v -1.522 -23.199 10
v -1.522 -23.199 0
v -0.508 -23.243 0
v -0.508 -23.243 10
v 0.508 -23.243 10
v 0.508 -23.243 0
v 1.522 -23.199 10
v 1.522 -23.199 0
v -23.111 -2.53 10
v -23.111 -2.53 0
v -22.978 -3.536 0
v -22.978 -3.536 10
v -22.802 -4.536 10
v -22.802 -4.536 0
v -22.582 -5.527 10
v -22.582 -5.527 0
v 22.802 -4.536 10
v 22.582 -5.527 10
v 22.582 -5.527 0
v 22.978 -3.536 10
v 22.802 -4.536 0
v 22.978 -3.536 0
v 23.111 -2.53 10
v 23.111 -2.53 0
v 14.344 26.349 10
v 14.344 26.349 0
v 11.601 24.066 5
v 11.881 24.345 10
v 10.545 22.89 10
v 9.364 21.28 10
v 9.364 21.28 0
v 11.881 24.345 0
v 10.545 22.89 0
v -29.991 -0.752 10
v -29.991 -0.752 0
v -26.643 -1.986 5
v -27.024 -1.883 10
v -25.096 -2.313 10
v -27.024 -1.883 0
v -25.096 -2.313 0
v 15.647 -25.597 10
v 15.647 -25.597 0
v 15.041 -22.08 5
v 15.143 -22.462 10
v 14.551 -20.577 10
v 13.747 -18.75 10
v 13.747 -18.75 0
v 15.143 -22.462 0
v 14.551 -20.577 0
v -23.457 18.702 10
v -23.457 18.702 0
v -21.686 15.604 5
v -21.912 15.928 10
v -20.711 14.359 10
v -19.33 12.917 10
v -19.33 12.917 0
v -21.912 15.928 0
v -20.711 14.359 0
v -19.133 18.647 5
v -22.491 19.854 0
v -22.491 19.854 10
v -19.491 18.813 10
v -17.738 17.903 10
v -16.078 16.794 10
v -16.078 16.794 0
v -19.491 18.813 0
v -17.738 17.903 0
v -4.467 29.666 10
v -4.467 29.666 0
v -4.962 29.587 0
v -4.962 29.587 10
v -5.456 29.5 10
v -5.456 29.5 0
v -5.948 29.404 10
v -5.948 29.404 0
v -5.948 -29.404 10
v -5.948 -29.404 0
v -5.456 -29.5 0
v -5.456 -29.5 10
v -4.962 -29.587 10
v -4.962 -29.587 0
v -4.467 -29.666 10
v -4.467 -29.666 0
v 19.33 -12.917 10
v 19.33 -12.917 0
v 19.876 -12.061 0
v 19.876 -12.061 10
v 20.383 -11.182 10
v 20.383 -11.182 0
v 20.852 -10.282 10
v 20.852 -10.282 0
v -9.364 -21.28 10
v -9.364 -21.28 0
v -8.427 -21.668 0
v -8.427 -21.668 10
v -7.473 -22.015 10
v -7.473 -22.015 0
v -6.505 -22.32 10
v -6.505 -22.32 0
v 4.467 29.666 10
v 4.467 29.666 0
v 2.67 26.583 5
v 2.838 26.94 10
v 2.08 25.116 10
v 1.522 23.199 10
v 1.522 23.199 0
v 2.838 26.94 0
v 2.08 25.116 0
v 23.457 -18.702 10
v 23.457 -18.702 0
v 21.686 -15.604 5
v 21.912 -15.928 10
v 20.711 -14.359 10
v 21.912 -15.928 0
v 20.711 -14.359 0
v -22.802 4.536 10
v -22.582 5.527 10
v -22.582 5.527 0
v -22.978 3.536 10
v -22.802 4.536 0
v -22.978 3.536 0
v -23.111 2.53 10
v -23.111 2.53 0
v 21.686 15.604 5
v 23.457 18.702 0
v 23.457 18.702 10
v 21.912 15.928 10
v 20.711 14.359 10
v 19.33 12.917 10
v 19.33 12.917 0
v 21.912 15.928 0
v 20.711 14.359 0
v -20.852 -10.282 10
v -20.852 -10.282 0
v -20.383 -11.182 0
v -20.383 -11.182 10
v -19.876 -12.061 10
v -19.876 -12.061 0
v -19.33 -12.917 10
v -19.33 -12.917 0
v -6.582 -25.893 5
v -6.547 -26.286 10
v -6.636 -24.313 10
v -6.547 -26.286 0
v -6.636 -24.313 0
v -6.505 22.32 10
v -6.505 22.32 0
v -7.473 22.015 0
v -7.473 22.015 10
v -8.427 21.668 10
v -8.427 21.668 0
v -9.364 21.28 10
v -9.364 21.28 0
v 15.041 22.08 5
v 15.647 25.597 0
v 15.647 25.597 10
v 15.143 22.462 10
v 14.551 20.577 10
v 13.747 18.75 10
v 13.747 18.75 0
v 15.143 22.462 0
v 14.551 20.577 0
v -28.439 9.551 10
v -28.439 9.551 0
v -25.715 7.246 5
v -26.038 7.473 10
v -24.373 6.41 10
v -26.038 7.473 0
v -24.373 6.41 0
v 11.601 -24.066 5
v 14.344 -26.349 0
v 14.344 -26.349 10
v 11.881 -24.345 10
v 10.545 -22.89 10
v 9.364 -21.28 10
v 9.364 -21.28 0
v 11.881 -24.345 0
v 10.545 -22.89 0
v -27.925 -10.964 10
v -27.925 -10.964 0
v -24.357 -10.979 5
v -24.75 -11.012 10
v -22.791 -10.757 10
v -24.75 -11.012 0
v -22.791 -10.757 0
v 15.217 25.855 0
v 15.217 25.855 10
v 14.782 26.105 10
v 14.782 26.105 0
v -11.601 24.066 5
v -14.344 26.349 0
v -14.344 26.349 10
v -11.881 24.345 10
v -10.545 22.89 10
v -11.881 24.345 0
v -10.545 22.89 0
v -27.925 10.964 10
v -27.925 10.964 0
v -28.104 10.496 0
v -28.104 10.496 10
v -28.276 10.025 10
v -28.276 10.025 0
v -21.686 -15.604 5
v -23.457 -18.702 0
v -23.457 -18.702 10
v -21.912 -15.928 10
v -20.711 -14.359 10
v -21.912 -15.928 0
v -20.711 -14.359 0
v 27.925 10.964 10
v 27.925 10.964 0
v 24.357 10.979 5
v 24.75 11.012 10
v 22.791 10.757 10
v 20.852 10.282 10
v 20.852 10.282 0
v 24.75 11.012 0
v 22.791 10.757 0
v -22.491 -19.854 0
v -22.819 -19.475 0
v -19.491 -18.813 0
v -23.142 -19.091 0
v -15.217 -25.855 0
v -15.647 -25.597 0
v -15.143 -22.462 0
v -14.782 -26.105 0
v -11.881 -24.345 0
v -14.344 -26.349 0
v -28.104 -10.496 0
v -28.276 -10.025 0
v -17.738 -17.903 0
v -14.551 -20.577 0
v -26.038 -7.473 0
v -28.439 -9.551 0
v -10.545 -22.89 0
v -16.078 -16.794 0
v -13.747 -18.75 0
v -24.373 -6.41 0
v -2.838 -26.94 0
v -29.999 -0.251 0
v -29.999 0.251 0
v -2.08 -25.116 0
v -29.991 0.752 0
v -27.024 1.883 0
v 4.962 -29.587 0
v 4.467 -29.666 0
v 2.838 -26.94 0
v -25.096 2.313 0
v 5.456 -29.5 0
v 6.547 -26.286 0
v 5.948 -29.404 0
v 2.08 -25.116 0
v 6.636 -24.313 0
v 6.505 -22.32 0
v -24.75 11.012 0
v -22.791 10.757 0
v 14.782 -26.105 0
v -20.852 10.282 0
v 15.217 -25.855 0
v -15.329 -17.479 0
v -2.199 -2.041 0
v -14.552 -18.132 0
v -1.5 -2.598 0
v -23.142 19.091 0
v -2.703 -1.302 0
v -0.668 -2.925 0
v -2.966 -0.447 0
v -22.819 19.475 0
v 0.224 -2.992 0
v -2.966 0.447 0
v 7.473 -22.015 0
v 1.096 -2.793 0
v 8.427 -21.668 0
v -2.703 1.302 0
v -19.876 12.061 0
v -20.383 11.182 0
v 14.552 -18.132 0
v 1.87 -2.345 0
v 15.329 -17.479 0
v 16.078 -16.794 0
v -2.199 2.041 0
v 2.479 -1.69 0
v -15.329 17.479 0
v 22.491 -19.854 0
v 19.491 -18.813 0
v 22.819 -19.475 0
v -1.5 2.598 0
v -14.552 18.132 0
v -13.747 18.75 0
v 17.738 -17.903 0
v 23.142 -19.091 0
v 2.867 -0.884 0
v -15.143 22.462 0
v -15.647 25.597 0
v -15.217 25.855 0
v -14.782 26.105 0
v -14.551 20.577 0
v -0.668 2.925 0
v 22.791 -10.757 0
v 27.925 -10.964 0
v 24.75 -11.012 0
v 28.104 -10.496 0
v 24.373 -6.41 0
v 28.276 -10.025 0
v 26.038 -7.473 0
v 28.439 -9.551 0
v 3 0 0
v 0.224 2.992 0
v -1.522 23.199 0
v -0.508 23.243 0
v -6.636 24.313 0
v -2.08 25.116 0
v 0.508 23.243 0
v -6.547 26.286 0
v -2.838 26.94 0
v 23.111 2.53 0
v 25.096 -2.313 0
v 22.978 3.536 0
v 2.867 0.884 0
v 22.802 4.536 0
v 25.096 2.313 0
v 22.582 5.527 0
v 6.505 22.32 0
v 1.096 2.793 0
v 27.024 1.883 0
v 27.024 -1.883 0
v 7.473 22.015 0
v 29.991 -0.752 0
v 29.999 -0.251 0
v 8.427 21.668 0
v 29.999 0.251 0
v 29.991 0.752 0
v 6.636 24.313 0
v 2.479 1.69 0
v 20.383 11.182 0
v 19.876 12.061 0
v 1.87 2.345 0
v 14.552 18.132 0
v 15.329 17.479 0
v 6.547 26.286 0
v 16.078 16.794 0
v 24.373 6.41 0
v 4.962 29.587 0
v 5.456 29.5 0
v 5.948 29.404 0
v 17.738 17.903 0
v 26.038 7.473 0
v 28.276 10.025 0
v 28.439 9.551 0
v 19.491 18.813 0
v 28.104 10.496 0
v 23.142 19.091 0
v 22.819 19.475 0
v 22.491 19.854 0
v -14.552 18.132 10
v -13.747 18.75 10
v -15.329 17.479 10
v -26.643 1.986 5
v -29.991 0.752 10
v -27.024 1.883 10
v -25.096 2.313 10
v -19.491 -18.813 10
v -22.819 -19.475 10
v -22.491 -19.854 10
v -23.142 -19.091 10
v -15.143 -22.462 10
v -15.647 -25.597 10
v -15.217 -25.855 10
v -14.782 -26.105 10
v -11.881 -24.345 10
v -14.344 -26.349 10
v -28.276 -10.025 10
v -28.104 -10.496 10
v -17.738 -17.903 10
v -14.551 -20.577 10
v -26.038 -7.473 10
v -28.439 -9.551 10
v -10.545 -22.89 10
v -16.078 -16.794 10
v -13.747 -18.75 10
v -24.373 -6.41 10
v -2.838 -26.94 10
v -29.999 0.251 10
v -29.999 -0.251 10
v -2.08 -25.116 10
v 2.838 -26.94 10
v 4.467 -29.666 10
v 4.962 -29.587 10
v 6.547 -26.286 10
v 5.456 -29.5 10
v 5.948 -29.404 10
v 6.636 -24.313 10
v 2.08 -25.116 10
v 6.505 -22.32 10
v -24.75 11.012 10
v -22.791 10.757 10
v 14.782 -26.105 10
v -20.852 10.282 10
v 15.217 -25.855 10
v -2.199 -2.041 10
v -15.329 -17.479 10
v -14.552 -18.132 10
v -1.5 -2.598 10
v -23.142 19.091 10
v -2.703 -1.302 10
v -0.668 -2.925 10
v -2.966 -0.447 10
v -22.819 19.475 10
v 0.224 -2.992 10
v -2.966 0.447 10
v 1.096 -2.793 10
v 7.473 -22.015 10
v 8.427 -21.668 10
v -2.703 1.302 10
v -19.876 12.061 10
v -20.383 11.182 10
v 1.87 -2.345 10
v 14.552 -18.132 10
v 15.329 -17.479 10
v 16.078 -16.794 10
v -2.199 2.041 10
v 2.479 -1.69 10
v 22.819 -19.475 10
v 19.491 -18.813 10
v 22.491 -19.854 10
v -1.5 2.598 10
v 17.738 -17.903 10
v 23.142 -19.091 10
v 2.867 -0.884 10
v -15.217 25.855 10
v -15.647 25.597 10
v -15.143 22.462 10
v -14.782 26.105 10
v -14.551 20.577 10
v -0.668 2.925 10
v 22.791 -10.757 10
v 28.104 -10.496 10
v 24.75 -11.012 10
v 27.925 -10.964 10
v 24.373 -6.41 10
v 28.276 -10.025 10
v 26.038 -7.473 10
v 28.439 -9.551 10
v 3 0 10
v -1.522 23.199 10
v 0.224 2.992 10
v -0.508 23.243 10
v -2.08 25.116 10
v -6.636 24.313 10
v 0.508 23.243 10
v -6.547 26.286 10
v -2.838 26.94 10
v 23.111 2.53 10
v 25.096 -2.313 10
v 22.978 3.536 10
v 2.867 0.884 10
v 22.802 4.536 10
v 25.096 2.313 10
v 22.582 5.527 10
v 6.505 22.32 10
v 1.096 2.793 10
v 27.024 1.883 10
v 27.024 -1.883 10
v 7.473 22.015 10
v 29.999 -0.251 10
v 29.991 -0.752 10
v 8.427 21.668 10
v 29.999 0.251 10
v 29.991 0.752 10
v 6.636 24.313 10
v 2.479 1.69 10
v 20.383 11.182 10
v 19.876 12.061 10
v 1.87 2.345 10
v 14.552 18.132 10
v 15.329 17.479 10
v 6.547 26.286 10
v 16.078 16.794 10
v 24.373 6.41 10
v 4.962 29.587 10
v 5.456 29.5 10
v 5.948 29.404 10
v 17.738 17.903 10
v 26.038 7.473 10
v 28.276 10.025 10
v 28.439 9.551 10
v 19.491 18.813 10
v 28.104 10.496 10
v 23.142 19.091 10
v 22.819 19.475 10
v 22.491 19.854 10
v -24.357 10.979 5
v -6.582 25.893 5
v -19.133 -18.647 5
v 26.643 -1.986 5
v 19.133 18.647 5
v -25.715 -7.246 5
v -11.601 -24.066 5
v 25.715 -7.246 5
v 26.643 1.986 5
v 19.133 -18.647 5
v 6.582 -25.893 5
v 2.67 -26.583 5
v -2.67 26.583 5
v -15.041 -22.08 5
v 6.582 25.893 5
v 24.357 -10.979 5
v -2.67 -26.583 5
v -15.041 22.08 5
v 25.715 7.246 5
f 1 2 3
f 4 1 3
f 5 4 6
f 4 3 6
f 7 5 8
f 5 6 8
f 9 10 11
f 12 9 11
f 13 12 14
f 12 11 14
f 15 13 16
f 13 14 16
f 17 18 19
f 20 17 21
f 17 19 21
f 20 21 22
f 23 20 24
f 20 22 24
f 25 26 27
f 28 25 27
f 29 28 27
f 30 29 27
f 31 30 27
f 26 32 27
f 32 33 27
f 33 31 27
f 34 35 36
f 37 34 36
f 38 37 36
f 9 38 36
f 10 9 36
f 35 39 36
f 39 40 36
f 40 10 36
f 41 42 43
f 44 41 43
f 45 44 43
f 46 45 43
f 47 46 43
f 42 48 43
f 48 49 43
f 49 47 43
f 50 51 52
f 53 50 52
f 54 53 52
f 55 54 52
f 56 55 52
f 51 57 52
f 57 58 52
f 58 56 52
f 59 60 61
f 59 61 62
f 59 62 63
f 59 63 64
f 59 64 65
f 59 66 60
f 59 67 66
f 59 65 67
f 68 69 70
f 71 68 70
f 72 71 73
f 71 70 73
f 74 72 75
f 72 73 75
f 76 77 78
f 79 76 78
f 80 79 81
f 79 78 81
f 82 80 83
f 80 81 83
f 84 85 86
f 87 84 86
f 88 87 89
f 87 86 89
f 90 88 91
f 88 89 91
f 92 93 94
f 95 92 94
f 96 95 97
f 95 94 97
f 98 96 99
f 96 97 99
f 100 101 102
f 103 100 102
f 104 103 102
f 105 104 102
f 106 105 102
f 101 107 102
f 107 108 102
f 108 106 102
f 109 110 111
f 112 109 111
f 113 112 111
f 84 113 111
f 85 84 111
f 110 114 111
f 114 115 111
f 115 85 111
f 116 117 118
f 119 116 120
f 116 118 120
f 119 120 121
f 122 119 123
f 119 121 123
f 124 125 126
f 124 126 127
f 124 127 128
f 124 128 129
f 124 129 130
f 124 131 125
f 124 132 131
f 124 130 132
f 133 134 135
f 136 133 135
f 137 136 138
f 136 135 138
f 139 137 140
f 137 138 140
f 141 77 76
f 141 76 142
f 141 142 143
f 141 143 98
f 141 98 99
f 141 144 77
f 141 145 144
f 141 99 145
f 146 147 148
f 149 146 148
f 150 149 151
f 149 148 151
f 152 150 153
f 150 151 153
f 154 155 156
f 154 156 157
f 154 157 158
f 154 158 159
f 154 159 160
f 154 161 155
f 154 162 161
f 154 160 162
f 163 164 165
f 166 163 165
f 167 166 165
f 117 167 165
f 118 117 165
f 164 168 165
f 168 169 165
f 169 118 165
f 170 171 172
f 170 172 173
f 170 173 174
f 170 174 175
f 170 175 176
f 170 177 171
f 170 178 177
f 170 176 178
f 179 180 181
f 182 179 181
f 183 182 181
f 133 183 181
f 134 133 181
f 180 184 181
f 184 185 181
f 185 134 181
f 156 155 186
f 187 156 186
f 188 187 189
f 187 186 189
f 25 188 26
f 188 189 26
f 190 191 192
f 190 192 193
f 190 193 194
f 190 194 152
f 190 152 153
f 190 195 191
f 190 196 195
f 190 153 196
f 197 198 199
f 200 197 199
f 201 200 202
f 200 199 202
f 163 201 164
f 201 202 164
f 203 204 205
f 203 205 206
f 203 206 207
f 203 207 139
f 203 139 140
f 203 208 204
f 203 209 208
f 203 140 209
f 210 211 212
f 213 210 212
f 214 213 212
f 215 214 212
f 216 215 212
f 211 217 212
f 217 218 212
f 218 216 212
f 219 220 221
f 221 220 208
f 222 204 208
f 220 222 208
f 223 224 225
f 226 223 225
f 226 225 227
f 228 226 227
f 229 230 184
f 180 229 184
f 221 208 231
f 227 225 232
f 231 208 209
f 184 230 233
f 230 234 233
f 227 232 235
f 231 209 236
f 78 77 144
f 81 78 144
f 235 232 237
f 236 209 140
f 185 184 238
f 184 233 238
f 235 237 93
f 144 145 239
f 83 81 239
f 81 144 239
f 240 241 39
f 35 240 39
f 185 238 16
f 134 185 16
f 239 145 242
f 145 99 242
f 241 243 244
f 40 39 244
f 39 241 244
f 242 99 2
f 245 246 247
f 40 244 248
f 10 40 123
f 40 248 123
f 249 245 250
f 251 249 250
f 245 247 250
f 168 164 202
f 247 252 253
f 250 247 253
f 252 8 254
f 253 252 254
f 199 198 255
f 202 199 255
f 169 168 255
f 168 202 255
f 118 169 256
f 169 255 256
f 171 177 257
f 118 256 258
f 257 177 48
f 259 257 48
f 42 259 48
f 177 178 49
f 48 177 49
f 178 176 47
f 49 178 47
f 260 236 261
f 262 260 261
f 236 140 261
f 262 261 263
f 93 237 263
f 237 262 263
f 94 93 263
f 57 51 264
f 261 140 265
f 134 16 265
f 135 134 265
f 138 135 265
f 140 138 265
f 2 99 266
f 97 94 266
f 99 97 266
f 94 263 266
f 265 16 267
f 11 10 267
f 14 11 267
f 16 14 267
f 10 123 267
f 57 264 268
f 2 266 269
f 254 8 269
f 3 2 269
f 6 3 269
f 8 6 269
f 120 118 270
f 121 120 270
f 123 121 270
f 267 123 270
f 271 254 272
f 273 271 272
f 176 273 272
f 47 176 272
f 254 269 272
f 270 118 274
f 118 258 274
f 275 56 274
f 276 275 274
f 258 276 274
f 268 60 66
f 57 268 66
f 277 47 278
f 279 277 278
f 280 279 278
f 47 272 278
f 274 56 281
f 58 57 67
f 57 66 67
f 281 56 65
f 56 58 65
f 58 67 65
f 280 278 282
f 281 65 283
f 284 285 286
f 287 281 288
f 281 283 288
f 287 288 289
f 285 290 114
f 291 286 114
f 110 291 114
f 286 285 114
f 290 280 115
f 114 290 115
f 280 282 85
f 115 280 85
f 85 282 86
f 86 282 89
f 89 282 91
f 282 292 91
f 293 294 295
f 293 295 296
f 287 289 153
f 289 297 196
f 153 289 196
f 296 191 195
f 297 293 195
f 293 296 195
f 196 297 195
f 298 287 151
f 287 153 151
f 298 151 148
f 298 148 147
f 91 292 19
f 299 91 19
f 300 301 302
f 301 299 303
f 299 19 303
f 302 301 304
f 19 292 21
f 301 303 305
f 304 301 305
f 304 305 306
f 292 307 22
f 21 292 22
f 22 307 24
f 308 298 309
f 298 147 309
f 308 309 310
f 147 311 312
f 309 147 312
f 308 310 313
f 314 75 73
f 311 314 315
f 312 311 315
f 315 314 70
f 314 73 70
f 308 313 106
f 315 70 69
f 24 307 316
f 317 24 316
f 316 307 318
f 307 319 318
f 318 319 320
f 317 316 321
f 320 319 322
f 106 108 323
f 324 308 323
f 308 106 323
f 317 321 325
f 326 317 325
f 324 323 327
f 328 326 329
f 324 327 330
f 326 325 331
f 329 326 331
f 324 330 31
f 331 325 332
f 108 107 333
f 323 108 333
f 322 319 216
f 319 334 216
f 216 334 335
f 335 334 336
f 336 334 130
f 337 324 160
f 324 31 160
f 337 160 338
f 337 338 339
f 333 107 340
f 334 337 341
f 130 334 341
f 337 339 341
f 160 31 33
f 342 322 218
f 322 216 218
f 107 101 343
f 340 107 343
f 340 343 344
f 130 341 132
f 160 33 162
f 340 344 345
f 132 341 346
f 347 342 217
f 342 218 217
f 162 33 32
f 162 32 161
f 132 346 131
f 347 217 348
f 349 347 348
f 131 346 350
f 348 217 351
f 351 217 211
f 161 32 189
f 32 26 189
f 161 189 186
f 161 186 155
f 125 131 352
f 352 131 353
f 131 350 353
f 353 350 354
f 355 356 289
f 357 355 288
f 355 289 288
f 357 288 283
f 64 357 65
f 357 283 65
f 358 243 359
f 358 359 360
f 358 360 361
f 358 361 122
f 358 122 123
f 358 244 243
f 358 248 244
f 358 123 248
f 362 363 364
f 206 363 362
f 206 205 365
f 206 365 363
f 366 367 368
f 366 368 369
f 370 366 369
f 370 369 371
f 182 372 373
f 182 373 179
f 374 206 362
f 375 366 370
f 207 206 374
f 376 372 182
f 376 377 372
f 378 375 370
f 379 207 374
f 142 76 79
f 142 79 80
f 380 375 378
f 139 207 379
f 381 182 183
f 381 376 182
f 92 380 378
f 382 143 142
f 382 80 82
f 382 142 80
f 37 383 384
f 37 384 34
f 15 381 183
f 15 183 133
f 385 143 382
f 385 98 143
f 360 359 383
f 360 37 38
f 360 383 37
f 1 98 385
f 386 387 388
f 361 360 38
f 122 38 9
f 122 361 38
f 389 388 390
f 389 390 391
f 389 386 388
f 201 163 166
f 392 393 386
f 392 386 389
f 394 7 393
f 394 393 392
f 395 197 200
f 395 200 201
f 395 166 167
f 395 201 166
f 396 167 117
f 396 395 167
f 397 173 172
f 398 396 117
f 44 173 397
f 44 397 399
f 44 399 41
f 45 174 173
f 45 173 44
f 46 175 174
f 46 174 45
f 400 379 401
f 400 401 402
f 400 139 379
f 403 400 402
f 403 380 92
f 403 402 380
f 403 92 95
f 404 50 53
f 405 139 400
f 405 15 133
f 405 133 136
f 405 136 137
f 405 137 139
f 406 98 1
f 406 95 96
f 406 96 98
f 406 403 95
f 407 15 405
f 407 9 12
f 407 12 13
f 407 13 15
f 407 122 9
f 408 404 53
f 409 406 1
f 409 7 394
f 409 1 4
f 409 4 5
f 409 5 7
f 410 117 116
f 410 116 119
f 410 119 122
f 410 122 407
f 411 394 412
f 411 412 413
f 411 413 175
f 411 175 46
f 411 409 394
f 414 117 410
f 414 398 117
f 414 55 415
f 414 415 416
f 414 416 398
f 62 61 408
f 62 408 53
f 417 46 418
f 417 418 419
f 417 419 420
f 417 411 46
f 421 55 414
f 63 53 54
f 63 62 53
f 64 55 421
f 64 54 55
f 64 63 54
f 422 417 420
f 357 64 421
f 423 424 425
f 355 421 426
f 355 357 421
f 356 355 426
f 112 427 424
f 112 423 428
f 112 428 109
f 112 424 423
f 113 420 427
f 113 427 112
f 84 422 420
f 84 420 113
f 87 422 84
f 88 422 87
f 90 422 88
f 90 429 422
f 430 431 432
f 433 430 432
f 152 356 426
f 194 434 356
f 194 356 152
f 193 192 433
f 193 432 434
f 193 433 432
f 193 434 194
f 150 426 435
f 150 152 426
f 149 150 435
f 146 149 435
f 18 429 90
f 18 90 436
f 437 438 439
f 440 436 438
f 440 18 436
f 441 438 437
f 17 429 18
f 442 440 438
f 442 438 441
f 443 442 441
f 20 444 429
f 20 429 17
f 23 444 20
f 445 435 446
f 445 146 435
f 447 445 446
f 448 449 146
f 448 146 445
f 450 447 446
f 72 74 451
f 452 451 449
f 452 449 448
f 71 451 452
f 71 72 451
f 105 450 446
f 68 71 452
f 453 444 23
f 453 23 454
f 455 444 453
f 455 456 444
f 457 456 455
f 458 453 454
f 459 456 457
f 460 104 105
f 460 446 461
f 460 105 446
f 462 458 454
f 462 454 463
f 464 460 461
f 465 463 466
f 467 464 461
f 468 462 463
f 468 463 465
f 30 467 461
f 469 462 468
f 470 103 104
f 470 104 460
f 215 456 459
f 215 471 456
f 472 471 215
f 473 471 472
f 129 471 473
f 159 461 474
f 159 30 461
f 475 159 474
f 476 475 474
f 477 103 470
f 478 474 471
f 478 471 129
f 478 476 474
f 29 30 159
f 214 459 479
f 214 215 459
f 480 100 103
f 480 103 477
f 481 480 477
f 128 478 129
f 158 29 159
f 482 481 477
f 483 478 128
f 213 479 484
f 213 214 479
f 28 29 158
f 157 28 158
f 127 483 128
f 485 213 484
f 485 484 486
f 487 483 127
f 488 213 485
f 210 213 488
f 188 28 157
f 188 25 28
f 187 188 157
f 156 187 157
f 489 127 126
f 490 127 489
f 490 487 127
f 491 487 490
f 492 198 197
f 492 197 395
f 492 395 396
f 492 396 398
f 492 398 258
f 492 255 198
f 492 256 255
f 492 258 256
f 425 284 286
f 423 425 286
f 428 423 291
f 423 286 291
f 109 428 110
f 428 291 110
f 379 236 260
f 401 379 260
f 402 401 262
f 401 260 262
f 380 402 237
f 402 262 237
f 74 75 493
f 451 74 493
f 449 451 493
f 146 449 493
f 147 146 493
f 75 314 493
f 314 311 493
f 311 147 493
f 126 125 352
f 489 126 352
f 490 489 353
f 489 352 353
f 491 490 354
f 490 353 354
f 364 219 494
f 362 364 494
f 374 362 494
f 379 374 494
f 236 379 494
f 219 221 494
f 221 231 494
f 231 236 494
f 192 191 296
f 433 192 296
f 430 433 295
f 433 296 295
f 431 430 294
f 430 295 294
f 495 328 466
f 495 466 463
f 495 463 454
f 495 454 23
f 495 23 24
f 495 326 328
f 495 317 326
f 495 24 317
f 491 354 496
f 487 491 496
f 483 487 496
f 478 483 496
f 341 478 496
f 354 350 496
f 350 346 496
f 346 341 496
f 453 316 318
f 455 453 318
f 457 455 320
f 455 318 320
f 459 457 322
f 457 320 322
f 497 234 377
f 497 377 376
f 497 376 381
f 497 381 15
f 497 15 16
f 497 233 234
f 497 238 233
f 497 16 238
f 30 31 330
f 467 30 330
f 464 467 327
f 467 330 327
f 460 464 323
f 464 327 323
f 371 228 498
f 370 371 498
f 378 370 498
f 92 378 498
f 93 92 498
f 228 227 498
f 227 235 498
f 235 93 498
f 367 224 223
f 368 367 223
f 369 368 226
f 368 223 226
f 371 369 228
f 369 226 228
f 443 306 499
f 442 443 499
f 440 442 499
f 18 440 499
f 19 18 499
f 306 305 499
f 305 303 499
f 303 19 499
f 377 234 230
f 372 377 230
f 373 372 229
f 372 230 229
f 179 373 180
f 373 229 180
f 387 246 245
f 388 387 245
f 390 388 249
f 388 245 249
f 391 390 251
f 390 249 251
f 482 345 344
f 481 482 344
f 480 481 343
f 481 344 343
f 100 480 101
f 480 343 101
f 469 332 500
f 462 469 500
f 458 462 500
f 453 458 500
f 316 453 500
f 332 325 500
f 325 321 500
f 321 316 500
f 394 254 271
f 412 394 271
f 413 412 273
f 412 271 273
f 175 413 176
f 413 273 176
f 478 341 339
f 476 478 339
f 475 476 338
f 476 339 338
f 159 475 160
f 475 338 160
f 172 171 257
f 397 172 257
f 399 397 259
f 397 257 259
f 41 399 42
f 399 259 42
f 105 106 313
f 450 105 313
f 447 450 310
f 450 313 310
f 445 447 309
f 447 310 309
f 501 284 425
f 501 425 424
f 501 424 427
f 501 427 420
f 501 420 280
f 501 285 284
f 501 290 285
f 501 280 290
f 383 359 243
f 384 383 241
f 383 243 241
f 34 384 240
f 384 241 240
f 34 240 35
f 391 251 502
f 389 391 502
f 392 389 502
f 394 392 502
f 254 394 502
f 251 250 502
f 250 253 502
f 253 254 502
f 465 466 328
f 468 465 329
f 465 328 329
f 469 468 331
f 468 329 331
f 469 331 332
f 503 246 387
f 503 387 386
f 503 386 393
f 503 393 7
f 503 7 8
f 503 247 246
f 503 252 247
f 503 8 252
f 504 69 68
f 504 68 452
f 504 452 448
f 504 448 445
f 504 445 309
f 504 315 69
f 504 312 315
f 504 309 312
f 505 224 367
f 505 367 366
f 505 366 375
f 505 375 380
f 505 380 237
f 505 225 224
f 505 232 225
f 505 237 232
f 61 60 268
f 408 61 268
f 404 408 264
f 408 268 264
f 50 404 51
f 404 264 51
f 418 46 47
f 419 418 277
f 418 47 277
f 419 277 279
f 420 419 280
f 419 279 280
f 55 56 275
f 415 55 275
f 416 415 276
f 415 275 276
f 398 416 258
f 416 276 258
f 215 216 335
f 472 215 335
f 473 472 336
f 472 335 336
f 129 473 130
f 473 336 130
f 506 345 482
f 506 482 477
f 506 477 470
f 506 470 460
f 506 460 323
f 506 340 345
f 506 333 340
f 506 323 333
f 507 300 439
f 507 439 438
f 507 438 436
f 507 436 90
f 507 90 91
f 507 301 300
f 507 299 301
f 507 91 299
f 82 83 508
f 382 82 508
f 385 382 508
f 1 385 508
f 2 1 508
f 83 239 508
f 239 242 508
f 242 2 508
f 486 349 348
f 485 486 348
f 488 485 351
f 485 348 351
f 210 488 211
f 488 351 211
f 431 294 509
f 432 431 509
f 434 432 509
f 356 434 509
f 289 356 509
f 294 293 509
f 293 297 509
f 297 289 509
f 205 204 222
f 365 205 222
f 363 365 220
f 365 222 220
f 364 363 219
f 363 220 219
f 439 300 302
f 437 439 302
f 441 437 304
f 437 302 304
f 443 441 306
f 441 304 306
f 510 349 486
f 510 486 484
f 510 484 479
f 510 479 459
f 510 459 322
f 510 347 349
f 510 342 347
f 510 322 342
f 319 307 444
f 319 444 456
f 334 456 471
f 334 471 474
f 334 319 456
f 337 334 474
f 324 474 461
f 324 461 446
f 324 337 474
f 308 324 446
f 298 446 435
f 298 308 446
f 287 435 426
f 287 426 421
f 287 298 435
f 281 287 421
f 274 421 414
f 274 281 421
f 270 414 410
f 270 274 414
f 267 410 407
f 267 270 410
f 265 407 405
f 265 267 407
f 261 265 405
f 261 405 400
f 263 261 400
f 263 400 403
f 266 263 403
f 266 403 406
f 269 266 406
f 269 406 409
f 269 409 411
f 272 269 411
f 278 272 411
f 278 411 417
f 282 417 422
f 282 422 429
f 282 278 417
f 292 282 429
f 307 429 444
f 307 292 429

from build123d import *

# Parameters (mm, degrees)
SKETCH1_R           = 3
BOSS_EXTRUDE1_DEPTH = 10


with BuildPart() as part:
    # Sketch1 → Boss-Extrude1 (new body)
    with BuildSketch(Plane.XY):
        with BuildLine():
            ThreePointArc((-6.504789318, 22.320477525), (-7.951626312, 21.846913741), (-9.364368684, 21.279675753))
            add(Edge.make_bspline(
                [(-14.34407304, 26.348578114), (-11.348209695, 24.318322412), (-9.364368684, 21.279675753)],
                knots=[0, 0, 0, 1, 1, 1], degree=2))
            ThreePointArc((-14.34407304, 26.348578114), (-15, 25.980762114), (-15.646501481, 25.596620703))
            add(Edge.make_bspline(
                [(-15.646501481, 25.596620703), (-15.386180139, 21.98699909), (-13.746555444, 18.749619047)],
                knots=[0, 0, 0, 1, 1, 1], degree=2))
            ThreePointArc((-13.746555444, 18.749619047), (-14.944169138, 17.809767258), (-16.077705902, 16.793551558))
            add(Edge.make_bspline(
                [(-22.49076405, 19.853602505), (-18.981185027, 18.970431814), (-16.077705902, 16.793551558)],
                knots=[0, 0, 0, 1, 1, 1], degree=2))
            ThreePointArc((-22.49076405, 19.853602505), (-22.981333294, 19.283628291), (-23.457461864, 18.701536913))
            add(Edge.make_bspline(
                [(-23.457461864, 18.701536913), (-21.978276518, 15.398637262), (-19.330284106, 12.917279798)],
                knots=[0, 0, 0, 1, 1, 1], degree=2))
            ThreePointArc((-19.330284106, 12.917279798), (-20.134224613, 11.6245), (-20.851834506, 10.281877199))
            add(Edge.make_bspline(
                [(-27.924736988, 10.963989426), (-24.324749311, 11.334427165), (-20.851834506, 10.281877199)],
                knots=[0, 0, 0, 1, 1, 1], degree=2))
            ThreePointArc((-27.924736988, 10.963989426), (-28.190778624, 10.2606043), (-28.439106151, 9.550771765))
            add(Edge.make_bspline(
                [(-28.439106151, 9.550771765), (-25.919468385, 6.95297252), (-22.58249522, 5.526925967)],
                knots=[0, 0, 0, 1, 1, 1], degree=2))
            ThreePointArc((-22.58249522, 5.526925967), (-22.89579545, 4.037146483), (-23.110924128, 2.530056705))
            add(Edge.make_bspline(
                [(-29.99057452, 0.751957411), (-26.734389834, 2.331323322), (-23.110924128, 2.530056705)],
                knots=[0, 0, 0, 1, 1, 1], degree=2))
            ThreePointArc((-29.99057452, 0.751957411), (-30, 0), (-29.99057452, -0.751957411))
            add(Edge.make_bspline(
                [(-29.99057452, -0.751957411), (-26.734389834, -2.331323322), (-23.110924128, -2.530056705)],
                knots=[0, 0, 0, 1, 1, 1], degree=2))
            ThreePointArc((-23.110924128, -2.530056705), (-22.89579545, -4.037146483), (-22.58249522, -5.526925967))
            add(Edge.make_bspline(
                [(-28.439106151, -9.550771765), (-25.919468385, -6.95297252), (-22.58249522, -5.526925967)],
                knots=[0, 0, 0, 1, 1, 1], degree=2))
            ThreePointArc((-28.439106151, -9.550771765), (-28.190778624, -10.2606043), (-27.924736988, -10.963989426))
            add(Edge.make_bspline(
                [(-27.924736988, -10.963989426), (-24.324749311, -11.334427165), (-20.851834506, -10.281877199)],
                knots=[0, 0, 0, 1, 1, 1], degree=2))
            ThreePointArc((-20.851834506, -10.281877199), (-20.134224613, -11.6245), (-19.330284106, -12.917279798))
            add(Edge.make_bspline(
                [(-23.457461864, -18.701536913), (-21.978276518, -15.398637262), (-19.330284106, -12.917279798)],
                knots=[0, 0, 0, 1, 1, 1], degree=2))
            ThreePointArc((-23.457461864, -18.701536913), (-22.981333294, -19.283628291), (-22.49076405, -19.853602505))
            add(Edge.make_bspline(
                [(-22.49076405, -19.853602505), (-18.981185027, -18.970431814), (-16.077705902, -16.793551558)],
                knots=[0, 0, 0, 1, 1, 1], degree=2))
            ThreePointArc((-16.077705902, -16.793551558), (-14.944169138, -17.809767258), (-13.746555444, -18.749619047))
            add(Edge.make_bspline(
                [(-15.646501481, -25.596620703), (-15.386180139, -21.98699909), (-13.746555444, -18.749619047)],
                knots=[0, 0, 0, 1, 1, 1], degree=2))
            ThreePointArc((-15.646501481, -25.596620703), (-15, -25.980762114), (-14.34407304, -26.348578114))
            add(Edge.make_bspline(
                [(-14.34407304, -26.348578114), (-11.348209695, -24.318322412), (-9.364368684, -21.279675753)],
                knots=[0, 0, 0, 1, 1, 1], degree=2))
            ThreePointArc((-9.364368684, -21.279675753), (-7.951626312, -21.846913741), (-6.504789318, -22.320477525))
            add(Edge.make_bspline(
                [(-5.948342101, -29.404374271), (-6.938283358, -25.923404334), (-6.504789318, -22.320477525)],
                knots=[0, 0, 0, 1, 1, 1], degree=2))
            ThreePointArc((-5.948342101, -29.404374271), (-5.20944533, -29.54423259), (-4.467275124, -29.665526339))
            add(Edge.make_bspline(
                [(-4.467275124, -29.665526339), (-2.346472793, -26.733064427), (-1.5215504, -23.199156997)],
                knots=[0, 0, 0, 1, 1, 1], degree=2))
            ThreePointArc((-1.5215504, -23.199156997), (0, -23.249), (1.5215504, -23.199156997))
            add(Edge.make_bspline(
                [(4.467275124, -29.665526339), (2.346472793, -26.733064427), (1.5215504, -23.199156997)],
                knots=[0, 0, 0, 1, 1, 1], degree=2))
            ThreePointArc((4.467275124, -29.665526339), (5.20944533, -29.54423259), (5.948342101, -29.404374271))
            add(Edge.make_bspline(
                [(5.948342101, -29.404374271), (6.938283358, -25.923404334), (6.504789318, -22.320477525)],
                knots=[0, 0, 0, 1, 1, 1], degree=2))
            ThreePointArc((6.504789318, -22.320477525), (7.951626312, -21.846913741), (9.364368684, -21.279675753))
            add(Edge.make_bspline(
                [(14.34407304, -26.348578114), (11.348209695, -24.318322412), (9.364368684, -21.279675753)],
                knots=[0, 0, 0, 1, 1, 1], degree=2))
            ThreePointArc((14.34407304, -26.348578114), (15, -25.980762114), (15.646501481, -25.596620703))
            add(Edge.make_bspline(
                [(15.646501481, -25.596620703), (15.386180139, -21.98699909), (13.746555444, -18.749619047)],
                knots=[0, 0, 0, 1, 1, 1], degree=2))
            ThreePointArc((13.746555444, -18.749619047), (14.944169138, -17.809767258), (16.077705902, -16.793551558))
            add(Edge.make_bspline(
                [(22.49076405, -19.853602505), (18.981185027, -18.970431814), (16.077705902, -16.793551558)],
                knots=[0, 0, 0, 1, 1, 1], degree=2))
            ThreePointArc((22.49076405, -19.853602505), (22.981333294, -19.283628291), (23.457461864, -18.701536913))
            add(Edge.make_bspline(
                [(23.457461864, -18.701536913), (21.978276518, -15.398637262), (19.330284106, -12.917279798)],
                knots=[0, 0, 0, 1, 1, 1], degree=2))
            ThreePointArc((19.330284106, -12.917279798), (20.134224613, -11.6245), (20.851834506, -10.281877199))
            add(Edge.make_bspline(
                [(27.924736988, -10.963989426), (24.324749311, -11.334427165), (20.851834506, -10.281877199)],
                knots=[0, 0, 0, 1, 1, 1], degree=2))
            ThreePointArc((27.924736988, -10.963989426), (28.190778624, -10.2606043), (28.439106151, -9.550771765))
            add(Edge.make_bspline(
                [(28.439106151, -9.550771765), (25.919468385, -6.95297252), (22.58249522, -5.526925967)],
                knots=[0, 0, 0, 1, 1, 1], degree=2))
            ThreePointArc((22.58249522, -5.526925967), (22.89579545, -4.037146483), (23.110924128, -2.530056705))
            add(Edge.make_bspline(
                [(29.99057452, -0.751957411), (26.734389834, -2.331323322), (23.110924128, -2.530056705)],
                knots=[0, 0, 0, 1, 1, 1], degree=2))
            ThreePointArc((29.99057452, -0.751957411), (30, 0), (29.99057452, 0.751957411))
            add(Edge.make_bspline(
                [(29.99057452, 0.751957411), (26.734389834, 2.331323322), (23.110924128, 2.530056705)],
                knots=[0, 0, 0, 1, 1, 1], degree=2))
            ThreePointArc((23.110924128, 2.530056705), (22.89579545, 4.037146483), (22.58249522, 5.526925967))
            add(Edge.make_bspline(
                [(28.439106151, 9.550771765), (25.919468385, 6.95297252), (22.58249522, 5.526925967)],
                knots=[0, 0, 0, 1, 1, 1], degree=2))
            ThreePointArc((28.439106151, 9.550771765), (28.190778624, 10.2606043), (27.924736988, 10.963989426))
            add(Edge.make_bspline(
                [(27.924736988, 10.963989426), (24.324749311, 11.334427165), (20.851834506, 10.281877199)],
                knots=[0, 0, 0, 1, 1, 1], degree=2))
            ThreePointArc((20.851834506, 10.281877199), (20.134224613, 11.6245), (19.330284106, 12.917279798))
            add(Edge.make_bspline(
                [(23.457461864, 18.701536913), (21.978276518, 15.398637262), (19.330284106, 12.917279798)],
                knots=[0, 0, 0, 1, 1, 1], degree=2))
            ThreePointArc((23.457461864, 18.701536913), (22.981333294, 19.283628291), (22.49076405, 19.853602505))
            add(Edge.make_bspline(
                [(22.49076405, 19.853602505), (18.981185027, 18.970431814), (16.077705902, 16.793551558)],
                knots=[0, 0, 0, 1, 1, 1], degree=2))
            ThreePointArc((16.077705902, 16.793551558), (14.944169138, 17.809767258), (13.746555444, 18.749619047))
            add(Edge.make_bspline(
                [(15.646501481, 25.596620703), (15.386180139, 21.98699909), (13.746555444, 18.749619047)],
                knots=[0, 0, 0, 1, 1, 1], degree=2))
            ThreePointArc((15.646501481, 25.596620703), (15, 25.980762114), (14.34407304, 26.348578114))
            add(Edge.make_bspline(
                [(14.34407304, 26.348578114), (11.348209695, 24.318322412), (9.364368684, 21.279675753)],
                knots=[0, 0, 0, 1, 1, 1], degree=2))
            ThreePointArc((9.364368684, 21.279675753), (7.951626312, 21.846913741), (6.504789318, 22.320477525))
            add(Edge.make_bspline(
                [(5.948342101, 29.404374271), (6.938283358, 25.923404334), (6.504789318, 22.320477525)],
                knots=[0, 0, 0, 1, 1, 1], degree=2))
            ThreePointArc((5.948342101, 29.404374271), (5.20944533, 29.54423259), (4.467275124, 29.665526339))
            add(Edge.make_bspline(
                [(4.467275124, 29.665526339), (2.346472793, 26.733064427), (1.5215504, 23.199156997)],
                knots=[0, 0, 0, 1, 1, 1], degree=2))
            ThreePointArc((1.5215504, 23.199156997), (0, 23.249), (-1.5215504, 23.199156997))
            add(Edge.make_bspline(
                [(-4.467275124, 29.665526339), (-2.346472793, 26.733064427), (-1.5215504, 23.199156997)],
                knots=[0, 0, 0, 1, 1, 1], degree=2))
            ThreePointArc((-4.467275124, 29.665526339), (-5.20944533, 29.54423259), (-5.948342101, 29.404374271))
            add(Edge.make_bspline(
                [(-5.948342101, 29.404374271), (-6.938283358, 25.923404334), (-6.504789318, 22.320477525)],
                knots=[0, 0, 0, 1, 1, 1], degree=2))
        make_face()
        Circle(SKETCH1_R, mode=Mode.SUBTRACT)
    extrude(amount=BOSS_EXTRUDE1_DEPTH)


solid = part.part
